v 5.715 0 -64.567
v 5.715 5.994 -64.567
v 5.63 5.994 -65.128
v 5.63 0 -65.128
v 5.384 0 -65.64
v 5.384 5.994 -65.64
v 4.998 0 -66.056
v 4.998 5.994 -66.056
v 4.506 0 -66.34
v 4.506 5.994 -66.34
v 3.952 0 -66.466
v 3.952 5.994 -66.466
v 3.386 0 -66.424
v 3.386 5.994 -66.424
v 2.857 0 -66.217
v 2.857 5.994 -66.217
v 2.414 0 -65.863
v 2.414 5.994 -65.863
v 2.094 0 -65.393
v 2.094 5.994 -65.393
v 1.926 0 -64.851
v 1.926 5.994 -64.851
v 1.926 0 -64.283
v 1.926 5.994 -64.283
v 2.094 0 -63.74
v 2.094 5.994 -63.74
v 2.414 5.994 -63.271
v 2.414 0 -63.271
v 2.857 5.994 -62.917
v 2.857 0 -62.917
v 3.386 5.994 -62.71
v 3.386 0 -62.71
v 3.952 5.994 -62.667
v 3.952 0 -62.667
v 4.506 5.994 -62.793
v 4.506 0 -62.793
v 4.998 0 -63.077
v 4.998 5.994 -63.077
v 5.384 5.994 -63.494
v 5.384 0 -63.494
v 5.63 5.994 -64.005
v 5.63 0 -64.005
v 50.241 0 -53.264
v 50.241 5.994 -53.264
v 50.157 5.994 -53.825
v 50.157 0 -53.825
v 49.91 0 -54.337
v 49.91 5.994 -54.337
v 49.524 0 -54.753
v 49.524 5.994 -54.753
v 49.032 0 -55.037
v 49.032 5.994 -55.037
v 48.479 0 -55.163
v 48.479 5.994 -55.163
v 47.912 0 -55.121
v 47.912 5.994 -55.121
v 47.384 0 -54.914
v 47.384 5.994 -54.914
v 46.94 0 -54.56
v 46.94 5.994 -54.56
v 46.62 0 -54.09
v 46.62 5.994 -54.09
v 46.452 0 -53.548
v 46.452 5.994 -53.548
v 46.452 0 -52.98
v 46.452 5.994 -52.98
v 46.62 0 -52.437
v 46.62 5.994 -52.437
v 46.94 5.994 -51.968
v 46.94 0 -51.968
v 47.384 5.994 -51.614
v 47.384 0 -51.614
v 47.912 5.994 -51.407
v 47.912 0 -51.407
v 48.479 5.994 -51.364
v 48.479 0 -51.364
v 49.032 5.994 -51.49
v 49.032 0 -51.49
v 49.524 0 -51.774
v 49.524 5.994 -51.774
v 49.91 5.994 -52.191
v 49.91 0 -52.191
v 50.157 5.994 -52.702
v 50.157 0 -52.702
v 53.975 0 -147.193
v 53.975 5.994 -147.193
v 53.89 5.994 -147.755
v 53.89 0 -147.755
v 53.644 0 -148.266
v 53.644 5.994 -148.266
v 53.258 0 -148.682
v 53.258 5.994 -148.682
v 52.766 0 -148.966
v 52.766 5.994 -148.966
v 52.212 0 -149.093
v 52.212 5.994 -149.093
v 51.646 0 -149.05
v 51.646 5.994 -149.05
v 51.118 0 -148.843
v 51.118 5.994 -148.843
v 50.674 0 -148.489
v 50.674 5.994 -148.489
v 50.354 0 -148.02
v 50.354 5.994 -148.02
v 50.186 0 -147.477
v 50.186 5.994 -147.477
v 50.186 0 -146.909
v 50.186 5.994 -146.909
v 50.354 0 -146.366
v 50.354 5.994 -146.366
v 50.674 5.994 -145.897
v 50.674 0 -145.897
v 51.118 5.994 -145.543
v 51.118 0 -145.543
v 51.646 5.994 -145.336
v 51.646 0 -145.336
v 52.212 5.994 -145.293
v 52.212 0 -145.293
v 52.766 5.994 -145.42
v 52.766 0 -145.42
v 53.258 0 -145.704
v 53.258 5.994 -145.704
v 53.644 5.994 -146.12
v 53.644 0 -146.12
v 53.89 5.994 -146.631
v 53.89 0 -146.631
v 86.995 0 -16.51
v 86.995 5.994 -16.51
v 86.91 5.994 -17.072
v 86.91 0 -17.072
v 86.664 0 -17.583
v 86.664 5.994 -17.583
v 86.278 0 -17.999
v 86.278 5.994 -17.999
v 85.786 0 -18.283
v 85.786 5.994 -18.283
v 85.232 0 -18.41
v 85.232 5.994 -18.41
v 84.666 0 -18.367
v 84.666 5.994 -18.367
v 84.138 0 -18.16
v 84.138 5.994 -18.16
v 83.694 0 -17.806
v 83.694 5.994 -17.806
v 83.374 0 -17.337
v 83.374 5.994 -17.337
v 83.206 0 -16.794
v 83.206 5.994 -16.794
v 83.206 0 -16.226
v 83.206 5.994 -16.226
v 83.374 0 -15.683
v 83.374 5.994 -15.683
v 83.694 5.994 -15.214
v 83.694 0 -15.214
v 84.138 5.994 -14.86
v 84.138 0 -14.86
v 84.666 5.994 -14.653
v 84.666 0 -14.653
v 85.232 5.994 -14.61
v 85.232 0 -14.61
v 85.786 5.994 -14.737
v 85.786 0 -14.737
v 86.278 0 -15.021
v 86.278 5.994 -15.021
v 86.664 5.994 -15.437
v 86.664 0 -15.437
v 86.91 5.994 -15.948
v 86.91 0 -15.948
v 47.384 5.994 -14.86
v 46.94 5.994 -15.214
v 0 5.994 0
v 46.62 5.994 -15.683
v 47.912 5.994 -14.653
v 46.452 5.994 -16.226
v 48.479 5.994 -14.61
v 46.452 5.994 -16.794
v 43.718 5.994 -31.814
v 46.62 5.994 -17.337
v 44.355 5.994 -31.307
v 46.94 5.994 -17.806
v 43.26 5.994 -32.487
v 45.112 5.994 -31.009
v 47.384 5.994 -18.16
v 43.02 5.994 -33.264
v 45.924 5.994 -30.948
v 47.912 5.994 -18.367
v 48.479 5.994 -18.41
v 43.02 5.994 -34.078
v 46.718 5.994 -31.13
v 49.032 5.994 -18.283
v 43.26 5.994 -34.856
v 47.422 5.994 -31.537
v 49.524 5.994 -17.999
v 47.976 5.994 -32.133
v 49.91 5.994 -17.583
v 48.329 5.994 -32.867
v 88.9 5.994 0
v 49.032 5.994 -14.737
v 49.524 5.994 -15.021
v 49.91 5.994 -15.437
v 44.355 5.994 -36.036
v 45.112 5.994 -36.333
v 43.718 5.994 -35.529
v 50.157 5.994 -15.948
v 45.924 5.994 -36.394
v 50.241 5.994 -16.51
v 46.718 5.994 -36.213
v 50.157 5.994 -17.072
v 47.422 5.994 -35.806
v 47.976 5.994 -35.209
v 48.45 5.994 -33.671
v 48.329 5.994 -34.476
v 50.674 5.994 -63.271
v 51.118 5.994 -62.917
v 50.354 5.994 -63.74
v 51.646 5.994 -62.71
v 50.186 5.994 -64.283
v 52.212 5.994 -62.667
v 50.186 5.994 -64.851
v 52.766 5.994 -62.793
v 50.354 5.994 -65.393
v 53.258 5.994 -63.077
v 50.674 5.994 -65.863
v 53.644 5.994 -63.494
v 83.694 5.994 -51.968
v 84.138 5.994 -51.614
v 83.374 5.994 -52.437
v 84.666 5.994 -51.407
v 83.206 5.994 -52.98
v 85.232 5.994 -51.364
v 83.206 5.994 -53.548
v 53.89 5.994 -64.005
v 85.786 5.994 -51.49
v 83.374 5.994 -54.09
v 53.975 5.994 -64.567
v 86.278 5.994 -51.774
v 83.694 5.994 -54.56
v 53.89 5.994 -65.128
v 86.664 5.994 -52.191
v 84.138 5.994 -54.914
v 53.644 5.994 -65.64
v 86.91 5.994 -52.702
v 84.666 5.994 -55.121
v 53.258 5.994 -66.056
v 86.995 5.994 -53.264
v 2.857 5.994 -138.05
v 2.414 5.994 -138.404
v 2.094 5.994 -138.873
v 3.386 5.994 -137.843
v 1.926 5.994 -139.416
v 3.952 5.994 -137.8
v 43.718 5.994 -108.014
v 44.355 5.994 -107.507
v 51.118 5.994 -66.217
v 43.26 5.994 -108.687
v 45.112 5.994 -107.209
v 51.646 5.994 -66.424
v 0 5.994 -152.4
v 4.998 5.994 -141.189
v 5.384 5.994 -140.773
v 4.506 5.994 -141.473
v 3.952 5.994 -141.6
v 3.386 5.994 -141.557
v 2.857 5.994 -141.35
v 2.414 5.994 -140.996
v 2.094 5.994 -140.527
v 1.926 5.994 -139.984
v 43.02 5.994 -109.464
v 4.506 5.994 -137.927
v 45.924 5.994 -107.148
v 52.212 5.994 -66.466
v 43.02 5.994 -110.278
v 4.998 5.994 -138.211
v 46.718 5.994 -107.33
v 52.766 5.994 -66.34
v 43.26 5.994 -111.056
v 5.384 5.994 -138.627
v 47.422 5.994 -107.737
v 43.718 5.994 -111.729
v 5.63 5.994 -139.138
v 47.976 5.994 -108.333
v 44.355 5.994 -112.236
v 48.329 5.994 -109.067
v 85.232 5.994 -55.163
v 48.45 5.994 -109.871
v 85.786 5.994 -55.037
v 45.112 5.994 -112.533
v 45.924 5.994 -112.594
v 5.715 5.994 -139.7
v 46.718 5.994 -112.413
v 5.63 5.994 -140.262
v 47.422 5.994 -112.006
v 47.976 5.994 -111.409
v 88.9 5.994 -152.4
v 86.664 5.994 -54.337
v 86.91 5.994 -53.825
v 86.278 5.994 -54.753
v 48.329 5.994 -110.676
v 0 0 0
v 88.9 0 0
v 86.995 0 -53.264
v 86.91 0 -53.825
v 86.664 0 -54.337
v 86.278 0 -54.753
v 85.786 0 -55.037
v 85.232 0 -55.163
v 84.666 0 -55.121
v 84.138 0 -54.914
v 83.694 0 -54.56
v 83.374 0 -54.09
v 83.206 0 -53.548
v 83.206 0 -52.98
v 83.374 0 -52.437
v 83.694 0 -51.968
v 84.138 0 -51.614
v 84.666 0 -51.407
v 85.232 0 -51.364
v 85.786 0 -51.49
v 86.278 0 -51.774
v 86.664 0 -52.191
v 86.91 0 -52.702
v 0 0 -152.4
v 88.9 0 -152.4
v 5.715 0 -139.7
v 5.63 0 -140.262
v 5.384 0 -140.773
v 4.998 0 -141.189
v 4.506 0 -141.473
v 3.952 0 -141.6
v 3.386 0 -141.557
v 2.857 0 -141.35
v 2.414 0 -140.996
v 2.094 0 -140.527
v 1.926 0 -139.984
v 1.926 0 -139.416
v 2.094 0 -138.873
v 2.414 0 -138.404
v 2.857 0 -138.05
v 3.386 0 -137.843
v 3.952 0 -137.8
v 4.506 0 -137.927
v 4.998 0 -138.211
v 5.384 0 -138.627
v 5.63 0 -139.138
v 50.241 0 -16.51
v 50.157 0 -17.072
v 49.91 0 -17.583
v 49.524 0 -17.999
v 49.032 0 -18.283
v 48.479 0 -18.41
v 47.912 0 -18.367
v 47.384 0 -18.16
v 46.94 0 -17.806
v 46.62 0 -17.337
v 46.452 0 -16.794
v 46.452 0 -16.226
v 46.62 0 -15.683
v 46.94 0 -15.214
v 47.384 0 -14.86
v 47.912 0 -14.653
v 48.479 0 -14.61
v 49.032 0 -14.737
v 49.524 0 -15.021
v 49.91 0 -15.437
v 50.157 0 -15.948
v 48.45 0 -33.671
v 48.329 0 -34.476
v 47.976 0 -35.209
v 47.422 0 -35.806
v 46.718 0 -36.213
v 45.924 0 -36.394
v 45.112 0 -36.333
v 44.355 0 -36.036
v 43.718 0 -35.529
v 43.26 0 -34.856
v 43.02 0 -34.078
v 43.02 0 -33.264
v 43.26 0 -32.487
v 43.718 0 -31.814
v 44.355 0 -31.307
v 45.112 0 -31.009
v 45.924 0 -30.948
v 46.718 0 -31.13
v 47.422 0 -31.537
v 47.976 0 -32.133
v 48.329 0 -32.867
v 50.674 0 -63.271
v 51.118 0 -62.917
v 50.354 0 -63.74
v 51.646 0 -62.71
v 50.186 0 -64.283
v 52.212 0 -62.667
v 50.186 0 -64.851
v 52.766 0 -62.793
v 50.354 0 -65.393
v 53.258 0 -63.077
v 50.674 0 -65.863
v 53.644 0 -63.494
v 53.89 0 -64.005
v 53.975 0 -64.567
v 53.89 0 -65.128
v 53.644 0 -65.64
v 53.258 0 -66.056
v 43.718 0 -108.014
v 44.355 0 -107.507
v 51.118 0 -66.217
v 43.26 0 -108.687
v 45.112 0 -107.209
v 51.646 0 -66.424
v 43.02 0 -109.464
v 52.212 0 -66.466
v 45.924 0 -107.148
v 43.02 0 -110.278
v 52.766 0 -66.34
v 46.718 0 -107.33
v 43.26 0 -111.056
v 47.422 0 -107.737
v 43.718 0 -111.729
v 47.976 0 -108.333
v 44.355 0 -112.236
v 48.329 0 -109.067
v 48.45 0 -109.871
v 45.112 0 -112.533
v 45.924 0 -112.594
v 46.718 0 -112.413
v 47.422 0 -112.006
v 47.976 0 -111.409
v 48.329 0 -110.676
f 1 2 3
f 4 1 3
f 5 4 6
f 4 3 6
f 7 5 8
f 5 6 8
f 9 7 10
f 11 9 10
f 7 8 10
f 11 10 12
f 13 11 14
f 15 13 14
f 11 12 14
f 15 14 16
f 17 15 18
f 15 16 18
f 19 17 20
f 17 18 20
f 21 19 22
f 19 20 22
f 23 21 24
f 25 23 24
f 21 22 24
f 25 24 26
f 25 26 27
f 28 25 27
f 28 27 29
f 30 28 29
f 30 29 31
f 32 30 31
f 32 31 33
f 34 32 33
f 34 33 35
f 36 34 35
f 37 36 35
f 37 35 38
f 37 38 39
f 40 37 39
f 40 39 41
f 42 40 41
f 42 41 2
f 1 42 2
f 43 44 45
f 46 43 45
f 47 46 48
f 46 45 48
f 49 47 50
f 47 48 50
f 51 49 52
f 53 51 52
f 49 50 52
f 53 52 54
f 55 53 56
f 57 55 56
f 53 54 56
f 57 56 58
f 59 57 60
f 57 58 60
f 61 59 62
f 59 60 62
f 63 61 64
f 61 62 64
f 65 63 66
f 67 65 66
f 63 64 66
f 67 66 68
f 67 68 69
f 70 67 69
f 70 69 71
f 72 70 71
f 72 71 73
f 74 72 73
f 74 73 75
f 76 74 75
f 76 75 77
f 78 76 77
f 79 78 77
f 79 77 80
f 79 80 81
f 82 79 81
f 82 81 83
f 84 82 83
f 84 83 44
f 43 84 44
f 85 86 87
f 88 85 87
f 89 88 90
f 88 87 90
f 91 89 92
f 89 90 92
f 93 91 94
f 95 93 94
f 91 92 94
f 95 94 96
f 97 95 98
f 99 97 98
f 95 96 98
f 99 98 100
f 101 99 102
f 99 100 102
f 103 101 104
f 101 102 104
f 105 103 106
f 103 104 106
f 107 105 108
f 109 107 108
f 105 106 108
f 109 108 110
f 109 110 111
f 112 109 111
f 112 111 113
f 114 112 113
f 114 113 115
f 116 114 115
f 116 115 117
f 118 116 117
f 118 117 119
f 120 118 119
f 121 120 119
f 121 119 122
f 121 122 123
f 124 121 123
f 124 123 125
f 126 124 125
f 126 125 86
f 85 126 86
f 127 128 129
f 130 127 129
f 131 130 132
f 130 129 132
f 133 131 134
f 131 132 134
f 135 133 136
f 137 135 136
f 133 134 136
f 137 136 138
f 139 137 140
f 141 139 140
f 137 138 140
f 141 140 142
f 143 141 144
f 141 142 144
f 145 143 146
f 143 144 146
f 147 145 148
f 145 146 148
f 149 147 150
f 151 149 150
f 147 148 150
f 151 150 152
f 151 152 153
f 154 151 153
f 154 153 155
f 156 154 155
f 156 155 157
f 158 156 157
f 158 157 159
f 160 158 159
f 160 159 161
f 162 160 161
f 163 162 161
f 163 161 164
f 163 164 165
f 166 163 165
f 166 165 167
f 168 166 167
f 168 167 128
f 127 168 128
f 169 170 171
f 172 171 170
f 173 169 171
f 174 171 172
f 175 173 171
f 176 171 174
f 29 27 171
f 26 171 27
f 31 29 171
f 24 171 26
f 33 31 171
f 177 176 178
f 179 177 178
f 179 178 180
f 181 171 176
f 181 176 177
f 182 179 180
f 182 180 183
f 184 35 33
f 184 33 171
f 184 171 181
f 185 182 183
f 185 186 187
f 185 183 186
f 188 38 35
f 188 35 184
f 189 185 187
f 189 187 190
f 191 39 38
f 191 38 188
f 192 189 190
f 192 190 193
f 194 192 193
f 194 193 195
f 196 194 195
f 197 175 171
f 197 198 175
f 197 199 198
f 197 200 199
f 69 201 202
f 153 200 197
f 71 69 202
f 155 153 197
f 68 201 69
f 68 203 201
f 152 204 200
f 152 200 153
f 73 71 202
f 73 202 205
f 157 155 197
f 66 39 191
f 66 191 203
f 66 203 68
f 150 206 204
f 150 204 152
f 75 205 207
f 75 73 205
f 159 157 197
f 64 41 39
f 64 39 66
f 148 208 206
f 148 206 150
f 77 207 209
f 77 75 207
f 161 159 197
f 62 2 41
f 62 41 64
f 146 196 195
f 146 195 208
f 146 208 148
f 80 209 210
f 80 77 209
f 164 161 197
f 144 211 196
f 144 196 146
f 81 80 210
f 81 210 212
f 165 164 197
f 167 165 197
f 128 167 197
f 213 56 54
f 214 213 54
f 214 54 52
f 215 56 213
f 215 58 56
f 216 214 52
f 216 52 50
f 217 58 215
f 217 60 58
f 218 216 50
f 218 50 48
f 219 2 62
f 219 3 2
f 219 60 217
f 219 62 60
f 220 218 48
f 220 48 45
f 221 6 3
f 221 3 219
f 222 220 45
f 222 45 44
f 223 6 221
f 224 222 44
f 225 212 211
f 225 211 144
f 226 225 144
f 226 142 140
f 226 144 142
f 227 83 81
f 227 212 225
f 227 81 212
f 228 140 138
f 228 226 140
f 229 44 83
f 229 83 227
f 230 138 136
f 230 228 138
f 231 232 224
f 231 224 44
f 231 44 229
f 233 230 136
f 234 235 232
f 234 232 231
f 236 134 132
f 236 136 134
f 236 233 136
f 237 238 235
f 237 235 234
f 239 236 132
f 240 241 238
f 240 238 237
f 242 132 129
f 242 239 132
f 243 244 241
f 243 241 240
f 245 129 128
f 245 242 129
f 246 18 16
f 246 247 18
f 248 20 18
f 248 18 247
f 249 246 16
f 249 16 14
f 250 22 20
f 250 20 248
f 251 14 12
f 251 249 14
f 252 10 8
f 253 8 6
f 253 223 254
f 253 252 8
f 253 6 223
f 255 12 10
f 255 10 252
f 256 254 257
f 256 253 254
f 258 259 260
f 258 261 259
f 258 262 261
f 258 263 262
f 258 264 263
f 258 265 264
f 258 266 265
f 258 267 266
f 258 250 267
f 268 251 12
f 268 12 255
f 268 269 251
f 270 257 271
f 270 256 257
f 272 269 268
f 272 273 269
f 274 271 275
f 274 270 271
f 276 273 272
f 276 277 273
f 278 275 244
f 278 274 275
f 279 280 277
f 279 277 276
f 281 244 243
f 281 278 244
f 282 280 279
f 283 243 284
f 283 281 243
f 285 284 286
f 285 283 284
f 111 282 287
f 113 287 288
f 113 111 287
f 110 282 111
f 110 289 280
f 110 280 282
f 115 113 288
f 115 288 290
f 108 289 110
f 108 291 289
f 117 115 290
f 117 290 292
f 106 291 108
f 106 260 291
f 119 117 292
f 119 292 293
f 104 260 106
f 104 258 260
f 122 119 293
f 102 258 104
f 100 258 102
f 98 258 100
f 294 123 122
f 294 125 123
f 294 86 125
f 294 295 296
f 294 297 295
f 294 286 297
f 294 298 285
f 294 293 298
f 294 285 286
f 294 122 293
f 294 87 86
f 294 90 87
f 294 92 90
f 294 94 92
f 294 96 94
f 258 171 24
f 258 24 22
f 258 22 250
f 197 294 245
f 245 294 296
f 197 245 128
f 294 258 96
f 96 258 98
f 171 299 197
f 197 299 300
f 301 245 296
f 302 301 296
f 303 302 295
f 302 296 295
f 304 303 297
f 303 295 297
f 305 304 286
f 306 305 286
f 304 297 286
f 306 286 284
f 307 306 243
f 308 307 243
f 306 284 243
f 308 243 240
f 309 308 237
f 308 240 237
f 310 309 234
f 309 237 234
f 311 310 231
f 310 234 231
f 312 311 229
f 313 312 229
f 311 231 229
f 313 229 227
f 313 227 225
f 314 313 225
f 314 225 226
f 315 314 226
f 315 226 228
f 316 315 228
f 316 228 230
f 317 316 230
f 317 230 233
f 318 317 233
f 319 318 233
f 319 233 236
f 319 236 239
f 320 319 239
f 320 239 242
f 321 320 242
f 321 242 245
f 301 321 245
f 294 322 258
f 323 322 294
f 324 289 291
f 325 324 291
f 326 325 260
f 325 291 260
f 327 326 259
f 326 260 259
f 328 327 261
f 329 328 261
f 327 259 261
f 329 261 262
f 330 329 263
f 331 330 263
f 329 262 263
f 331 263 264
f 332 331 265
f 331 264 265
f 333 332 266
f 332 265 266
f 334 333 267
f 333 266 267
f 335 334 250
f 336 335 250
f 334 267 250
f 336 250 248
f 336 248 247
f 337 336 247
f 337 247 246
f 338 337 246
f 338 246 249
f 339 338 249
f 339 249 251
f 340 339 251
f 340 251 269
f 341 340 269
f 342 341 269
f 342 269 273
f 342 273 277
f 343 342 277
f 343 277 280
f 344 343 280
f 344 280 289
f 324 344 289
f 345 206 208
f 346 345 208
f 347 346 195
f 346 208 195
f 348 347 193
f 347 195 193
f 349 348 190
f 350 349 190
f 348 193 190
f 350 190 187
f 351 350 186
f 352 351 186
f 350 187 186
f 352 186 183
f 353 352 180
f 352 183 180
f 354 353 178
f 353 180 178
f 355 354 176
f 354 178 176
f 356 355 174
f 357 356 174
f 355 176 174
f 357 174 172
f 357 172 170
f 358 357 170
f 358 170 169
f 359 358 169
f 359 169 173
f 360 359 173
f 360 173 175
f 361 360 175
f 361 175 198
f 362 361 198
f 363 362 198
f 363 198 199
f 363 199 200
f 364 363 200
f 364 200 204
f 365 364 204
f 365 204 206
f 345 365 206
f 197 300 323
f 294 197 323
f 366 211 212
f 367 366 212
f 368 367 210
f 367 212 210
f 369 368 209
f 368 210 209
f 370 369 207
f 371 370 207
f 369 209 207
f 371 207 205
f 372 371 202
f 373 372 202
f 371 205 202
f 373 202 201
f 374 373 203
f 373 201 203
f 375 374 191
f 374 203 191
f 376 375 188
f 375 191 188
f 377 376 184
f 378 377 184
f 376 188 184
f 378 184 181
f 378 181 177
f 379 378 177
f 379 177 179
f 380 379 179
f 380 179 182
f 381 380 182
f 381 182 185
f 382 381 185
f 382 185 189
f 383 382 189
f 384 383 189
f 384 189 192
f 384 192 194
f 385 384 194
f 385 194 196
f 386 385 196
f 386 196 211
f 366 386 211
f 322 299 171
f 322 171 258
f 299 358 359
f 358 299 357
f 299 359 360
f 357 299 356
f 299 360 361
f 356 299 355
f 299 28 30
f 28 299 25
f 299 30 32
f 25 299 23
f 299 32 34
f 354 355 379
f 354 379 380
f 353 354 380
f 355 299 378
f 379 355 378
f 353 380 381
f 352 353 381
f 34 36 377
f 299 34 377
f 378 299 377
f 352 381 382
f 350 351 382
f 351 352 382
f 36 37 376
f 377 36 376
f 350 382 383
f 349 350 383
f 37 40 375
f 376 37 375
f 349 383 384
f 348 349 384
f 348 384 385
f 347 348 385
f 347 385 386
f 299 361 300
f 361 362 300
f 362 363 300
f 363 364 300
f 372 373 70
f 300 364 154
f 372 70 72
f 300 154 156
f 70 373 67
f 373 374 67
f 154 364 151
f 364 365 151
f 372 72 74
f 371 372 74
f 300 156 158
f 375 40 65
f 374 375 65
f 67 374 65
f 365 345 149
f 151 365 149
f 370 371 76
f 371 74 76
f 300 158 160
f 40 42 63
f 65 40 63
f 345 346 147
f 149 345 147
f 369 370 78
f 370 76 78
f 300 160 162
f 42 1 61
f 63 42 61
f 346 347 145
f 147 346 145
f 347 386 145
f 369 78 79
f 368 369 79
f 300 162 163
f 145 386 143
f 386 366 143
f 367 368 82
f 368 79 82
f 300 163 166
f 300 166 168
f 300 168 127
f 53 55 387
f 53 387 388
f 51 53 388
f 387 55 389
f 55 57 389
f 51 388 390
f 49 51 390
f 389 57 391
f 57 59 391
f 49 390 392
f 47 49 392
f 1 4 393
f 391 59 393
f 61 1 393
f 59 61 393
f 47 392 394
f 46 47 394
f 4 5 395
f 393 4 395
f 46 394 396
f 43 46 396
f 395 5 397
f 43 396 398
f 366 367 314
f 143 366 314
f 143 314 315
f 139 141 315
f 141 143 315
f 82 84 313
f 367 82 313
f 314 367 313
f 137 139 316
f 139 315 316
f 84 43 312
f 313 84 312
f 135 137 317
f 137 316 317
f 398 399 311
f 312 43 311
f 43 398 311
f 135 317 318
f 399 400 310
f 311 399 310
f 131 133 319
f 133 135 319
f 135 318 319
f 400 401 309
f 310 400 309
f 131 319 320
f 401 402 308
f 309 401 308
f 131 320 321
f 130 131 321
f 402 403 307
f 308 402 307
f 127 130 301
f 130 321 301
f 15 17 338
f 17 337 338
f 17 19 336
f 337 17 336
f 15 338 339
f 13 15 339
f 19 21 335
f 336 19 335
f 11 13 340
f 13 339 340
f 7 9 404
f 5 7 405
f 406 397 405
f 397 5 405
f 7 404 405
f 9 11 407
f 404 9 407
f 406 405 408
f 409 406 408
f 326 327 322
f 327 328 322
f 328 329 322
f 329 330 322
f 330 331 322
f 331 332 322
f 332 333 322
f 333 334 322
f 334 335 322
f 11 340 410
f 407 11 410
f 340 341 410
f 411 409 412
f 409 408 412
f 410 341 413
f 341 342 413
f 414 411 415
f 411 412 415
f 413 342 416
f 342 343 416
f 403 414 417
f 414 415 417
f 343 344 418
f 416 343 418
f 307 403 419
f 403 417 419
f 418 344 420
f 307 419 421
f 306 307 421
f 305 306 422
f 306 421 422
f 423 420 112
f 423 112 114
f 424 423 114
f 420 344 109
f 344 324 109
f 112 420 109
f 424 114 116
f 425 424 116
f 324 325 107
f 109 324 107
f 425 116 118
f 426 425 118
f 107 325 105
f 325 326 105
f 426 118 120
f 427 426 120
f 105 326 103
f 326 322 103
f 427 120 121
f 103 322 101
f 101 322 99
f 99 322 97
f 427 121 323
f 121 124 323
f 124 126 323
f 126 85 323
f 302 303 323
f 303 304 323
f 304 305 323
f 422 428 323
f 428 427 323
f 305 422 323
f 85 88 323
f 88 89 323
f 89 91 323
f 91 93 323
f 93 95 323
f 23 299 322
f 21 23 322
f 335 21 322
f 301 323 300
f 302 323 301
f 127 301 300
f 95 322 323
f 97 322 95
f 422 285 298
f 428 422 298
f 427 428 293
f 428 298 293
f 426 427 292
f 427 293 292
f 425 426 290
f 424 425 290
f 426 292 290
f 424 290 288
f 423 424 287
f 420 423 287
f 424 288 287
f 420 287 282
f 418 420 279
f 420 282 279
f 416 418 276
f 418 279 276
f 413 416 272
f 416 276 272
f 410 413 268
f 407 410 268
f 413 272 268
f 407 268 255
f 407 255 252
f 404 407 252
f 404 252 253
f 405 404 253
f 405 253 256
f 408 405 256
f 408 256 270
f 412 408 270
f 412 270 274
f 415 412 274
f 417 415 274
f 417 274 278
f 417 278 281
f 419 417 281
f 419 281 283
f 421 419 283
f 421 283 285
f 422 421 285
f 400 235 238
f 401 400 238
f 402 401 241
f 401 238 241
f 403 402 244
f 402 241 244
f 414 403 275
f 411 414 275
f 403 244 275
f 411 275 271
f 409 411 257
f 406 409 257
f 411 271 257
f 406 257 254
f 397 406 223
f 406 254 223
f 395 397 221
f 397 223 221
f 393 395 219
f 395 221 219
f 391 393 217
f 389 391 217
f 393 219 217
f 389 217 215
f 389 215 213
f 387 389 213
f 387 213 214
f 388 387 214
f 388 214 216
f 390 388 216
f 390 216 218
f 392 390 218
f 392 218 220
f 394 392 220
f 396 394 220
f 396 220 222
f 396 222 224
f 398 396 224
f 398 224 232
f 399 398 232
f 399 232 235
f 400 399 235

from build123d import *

# Parameters (mm, degrees)
SKETCH2_W               = 88.9
SKETCH2_H               = 152.4
BOSS_EXTRUDE1_DEPTH     = 5.9944
SKETCH3_R               = 1.905
CUT_EXTRUDE1_DEPTH      = 1
CUT_EXTRUDE1_DEPTH_BACK = 6.9944
SKETCH4_R               = 2.7305
CUT_EXTRUDE2_DEPTH      = 1
CUT_EXTRUDE2_DEPTH_BACK = 6.9944


with BuildPart() as part:
    # Sketch2 → Boss-Extrude1 (new body)
    with BuildSketch(Plane(origin=(0, 0, 0), x_dir=(1, 0, 0), z_dir=(0, 1, 0))):
        with Locations((44.45, 76.2)):
            Rectangle(SKETCH2_W, SKETCH2_H)
    extrude(amount=BOSS_EXTRUDE1_DEPTH)

    # Sketch3 → Cut-Extrude1 (cut, two sides)
    with BuildSketch(Plane(origin=(0, 5.9944, 0), x_dir=(1, 0, 0), z_dir=(0, 1, 0))) as cut_extrude1_sk:
        with Locations((52.07, 147.193)):
            Circle(SKETCH3_R)
        with Locations((3.81, 139.7)):
            Circle(SKETCH3_R)
        with Locations((3.81, 64.5668)):
            Circle(SKETCH3_R)
        with Locations((52.07, 64.5668)):
            Circle(SKETCH3_R)
        with Locations((48.3362, 53.2638)):
            Circle(SKETCH3_R)
        with Locations((85.09, 53.2638)):
            Circle(SKETCH3_R)
        with Locations((48.3362, 16.51)):
            Circle(SKETCH3_R)
        with Locations((85.09, 16.51)):
            Circle(SKETCH3_R)
    extrude(amount=CUT_EXTRUDE1_DEPTH, mode=Mode.SUBTRACT)
    extrude(cut_extrude1_sk.sketch, amount=-CUT_EXTRUDE1_DEPTH_BACK, mode=Mode.SUBTRACT)

    # Sketch4 → Cut-Extrude2 (cut, two sides)
    with BuildSketch(Plane(origin=(0, 5.9944, 0), x_dir=(1, 0, 0), z_dir=(0, 1, 0))) as cut_extrude2_sk:
        with Locations((45.72, 109.871331367)):
            Circle(SKETCH4_R)
        with Locations((45.72, 33.671331367)):
            Circle(SKETCH4_R)
    extrude(amount=CUT_EXTRUDE2_DEPTH, mode=Mode.SUBTRACT)
    extrude(cut_extrude2_sk.sketch, amount=-CUT_EXTRUDE2_DEPTH_BACK, mode=Mode.SUBTRACT)


solid = part.part
